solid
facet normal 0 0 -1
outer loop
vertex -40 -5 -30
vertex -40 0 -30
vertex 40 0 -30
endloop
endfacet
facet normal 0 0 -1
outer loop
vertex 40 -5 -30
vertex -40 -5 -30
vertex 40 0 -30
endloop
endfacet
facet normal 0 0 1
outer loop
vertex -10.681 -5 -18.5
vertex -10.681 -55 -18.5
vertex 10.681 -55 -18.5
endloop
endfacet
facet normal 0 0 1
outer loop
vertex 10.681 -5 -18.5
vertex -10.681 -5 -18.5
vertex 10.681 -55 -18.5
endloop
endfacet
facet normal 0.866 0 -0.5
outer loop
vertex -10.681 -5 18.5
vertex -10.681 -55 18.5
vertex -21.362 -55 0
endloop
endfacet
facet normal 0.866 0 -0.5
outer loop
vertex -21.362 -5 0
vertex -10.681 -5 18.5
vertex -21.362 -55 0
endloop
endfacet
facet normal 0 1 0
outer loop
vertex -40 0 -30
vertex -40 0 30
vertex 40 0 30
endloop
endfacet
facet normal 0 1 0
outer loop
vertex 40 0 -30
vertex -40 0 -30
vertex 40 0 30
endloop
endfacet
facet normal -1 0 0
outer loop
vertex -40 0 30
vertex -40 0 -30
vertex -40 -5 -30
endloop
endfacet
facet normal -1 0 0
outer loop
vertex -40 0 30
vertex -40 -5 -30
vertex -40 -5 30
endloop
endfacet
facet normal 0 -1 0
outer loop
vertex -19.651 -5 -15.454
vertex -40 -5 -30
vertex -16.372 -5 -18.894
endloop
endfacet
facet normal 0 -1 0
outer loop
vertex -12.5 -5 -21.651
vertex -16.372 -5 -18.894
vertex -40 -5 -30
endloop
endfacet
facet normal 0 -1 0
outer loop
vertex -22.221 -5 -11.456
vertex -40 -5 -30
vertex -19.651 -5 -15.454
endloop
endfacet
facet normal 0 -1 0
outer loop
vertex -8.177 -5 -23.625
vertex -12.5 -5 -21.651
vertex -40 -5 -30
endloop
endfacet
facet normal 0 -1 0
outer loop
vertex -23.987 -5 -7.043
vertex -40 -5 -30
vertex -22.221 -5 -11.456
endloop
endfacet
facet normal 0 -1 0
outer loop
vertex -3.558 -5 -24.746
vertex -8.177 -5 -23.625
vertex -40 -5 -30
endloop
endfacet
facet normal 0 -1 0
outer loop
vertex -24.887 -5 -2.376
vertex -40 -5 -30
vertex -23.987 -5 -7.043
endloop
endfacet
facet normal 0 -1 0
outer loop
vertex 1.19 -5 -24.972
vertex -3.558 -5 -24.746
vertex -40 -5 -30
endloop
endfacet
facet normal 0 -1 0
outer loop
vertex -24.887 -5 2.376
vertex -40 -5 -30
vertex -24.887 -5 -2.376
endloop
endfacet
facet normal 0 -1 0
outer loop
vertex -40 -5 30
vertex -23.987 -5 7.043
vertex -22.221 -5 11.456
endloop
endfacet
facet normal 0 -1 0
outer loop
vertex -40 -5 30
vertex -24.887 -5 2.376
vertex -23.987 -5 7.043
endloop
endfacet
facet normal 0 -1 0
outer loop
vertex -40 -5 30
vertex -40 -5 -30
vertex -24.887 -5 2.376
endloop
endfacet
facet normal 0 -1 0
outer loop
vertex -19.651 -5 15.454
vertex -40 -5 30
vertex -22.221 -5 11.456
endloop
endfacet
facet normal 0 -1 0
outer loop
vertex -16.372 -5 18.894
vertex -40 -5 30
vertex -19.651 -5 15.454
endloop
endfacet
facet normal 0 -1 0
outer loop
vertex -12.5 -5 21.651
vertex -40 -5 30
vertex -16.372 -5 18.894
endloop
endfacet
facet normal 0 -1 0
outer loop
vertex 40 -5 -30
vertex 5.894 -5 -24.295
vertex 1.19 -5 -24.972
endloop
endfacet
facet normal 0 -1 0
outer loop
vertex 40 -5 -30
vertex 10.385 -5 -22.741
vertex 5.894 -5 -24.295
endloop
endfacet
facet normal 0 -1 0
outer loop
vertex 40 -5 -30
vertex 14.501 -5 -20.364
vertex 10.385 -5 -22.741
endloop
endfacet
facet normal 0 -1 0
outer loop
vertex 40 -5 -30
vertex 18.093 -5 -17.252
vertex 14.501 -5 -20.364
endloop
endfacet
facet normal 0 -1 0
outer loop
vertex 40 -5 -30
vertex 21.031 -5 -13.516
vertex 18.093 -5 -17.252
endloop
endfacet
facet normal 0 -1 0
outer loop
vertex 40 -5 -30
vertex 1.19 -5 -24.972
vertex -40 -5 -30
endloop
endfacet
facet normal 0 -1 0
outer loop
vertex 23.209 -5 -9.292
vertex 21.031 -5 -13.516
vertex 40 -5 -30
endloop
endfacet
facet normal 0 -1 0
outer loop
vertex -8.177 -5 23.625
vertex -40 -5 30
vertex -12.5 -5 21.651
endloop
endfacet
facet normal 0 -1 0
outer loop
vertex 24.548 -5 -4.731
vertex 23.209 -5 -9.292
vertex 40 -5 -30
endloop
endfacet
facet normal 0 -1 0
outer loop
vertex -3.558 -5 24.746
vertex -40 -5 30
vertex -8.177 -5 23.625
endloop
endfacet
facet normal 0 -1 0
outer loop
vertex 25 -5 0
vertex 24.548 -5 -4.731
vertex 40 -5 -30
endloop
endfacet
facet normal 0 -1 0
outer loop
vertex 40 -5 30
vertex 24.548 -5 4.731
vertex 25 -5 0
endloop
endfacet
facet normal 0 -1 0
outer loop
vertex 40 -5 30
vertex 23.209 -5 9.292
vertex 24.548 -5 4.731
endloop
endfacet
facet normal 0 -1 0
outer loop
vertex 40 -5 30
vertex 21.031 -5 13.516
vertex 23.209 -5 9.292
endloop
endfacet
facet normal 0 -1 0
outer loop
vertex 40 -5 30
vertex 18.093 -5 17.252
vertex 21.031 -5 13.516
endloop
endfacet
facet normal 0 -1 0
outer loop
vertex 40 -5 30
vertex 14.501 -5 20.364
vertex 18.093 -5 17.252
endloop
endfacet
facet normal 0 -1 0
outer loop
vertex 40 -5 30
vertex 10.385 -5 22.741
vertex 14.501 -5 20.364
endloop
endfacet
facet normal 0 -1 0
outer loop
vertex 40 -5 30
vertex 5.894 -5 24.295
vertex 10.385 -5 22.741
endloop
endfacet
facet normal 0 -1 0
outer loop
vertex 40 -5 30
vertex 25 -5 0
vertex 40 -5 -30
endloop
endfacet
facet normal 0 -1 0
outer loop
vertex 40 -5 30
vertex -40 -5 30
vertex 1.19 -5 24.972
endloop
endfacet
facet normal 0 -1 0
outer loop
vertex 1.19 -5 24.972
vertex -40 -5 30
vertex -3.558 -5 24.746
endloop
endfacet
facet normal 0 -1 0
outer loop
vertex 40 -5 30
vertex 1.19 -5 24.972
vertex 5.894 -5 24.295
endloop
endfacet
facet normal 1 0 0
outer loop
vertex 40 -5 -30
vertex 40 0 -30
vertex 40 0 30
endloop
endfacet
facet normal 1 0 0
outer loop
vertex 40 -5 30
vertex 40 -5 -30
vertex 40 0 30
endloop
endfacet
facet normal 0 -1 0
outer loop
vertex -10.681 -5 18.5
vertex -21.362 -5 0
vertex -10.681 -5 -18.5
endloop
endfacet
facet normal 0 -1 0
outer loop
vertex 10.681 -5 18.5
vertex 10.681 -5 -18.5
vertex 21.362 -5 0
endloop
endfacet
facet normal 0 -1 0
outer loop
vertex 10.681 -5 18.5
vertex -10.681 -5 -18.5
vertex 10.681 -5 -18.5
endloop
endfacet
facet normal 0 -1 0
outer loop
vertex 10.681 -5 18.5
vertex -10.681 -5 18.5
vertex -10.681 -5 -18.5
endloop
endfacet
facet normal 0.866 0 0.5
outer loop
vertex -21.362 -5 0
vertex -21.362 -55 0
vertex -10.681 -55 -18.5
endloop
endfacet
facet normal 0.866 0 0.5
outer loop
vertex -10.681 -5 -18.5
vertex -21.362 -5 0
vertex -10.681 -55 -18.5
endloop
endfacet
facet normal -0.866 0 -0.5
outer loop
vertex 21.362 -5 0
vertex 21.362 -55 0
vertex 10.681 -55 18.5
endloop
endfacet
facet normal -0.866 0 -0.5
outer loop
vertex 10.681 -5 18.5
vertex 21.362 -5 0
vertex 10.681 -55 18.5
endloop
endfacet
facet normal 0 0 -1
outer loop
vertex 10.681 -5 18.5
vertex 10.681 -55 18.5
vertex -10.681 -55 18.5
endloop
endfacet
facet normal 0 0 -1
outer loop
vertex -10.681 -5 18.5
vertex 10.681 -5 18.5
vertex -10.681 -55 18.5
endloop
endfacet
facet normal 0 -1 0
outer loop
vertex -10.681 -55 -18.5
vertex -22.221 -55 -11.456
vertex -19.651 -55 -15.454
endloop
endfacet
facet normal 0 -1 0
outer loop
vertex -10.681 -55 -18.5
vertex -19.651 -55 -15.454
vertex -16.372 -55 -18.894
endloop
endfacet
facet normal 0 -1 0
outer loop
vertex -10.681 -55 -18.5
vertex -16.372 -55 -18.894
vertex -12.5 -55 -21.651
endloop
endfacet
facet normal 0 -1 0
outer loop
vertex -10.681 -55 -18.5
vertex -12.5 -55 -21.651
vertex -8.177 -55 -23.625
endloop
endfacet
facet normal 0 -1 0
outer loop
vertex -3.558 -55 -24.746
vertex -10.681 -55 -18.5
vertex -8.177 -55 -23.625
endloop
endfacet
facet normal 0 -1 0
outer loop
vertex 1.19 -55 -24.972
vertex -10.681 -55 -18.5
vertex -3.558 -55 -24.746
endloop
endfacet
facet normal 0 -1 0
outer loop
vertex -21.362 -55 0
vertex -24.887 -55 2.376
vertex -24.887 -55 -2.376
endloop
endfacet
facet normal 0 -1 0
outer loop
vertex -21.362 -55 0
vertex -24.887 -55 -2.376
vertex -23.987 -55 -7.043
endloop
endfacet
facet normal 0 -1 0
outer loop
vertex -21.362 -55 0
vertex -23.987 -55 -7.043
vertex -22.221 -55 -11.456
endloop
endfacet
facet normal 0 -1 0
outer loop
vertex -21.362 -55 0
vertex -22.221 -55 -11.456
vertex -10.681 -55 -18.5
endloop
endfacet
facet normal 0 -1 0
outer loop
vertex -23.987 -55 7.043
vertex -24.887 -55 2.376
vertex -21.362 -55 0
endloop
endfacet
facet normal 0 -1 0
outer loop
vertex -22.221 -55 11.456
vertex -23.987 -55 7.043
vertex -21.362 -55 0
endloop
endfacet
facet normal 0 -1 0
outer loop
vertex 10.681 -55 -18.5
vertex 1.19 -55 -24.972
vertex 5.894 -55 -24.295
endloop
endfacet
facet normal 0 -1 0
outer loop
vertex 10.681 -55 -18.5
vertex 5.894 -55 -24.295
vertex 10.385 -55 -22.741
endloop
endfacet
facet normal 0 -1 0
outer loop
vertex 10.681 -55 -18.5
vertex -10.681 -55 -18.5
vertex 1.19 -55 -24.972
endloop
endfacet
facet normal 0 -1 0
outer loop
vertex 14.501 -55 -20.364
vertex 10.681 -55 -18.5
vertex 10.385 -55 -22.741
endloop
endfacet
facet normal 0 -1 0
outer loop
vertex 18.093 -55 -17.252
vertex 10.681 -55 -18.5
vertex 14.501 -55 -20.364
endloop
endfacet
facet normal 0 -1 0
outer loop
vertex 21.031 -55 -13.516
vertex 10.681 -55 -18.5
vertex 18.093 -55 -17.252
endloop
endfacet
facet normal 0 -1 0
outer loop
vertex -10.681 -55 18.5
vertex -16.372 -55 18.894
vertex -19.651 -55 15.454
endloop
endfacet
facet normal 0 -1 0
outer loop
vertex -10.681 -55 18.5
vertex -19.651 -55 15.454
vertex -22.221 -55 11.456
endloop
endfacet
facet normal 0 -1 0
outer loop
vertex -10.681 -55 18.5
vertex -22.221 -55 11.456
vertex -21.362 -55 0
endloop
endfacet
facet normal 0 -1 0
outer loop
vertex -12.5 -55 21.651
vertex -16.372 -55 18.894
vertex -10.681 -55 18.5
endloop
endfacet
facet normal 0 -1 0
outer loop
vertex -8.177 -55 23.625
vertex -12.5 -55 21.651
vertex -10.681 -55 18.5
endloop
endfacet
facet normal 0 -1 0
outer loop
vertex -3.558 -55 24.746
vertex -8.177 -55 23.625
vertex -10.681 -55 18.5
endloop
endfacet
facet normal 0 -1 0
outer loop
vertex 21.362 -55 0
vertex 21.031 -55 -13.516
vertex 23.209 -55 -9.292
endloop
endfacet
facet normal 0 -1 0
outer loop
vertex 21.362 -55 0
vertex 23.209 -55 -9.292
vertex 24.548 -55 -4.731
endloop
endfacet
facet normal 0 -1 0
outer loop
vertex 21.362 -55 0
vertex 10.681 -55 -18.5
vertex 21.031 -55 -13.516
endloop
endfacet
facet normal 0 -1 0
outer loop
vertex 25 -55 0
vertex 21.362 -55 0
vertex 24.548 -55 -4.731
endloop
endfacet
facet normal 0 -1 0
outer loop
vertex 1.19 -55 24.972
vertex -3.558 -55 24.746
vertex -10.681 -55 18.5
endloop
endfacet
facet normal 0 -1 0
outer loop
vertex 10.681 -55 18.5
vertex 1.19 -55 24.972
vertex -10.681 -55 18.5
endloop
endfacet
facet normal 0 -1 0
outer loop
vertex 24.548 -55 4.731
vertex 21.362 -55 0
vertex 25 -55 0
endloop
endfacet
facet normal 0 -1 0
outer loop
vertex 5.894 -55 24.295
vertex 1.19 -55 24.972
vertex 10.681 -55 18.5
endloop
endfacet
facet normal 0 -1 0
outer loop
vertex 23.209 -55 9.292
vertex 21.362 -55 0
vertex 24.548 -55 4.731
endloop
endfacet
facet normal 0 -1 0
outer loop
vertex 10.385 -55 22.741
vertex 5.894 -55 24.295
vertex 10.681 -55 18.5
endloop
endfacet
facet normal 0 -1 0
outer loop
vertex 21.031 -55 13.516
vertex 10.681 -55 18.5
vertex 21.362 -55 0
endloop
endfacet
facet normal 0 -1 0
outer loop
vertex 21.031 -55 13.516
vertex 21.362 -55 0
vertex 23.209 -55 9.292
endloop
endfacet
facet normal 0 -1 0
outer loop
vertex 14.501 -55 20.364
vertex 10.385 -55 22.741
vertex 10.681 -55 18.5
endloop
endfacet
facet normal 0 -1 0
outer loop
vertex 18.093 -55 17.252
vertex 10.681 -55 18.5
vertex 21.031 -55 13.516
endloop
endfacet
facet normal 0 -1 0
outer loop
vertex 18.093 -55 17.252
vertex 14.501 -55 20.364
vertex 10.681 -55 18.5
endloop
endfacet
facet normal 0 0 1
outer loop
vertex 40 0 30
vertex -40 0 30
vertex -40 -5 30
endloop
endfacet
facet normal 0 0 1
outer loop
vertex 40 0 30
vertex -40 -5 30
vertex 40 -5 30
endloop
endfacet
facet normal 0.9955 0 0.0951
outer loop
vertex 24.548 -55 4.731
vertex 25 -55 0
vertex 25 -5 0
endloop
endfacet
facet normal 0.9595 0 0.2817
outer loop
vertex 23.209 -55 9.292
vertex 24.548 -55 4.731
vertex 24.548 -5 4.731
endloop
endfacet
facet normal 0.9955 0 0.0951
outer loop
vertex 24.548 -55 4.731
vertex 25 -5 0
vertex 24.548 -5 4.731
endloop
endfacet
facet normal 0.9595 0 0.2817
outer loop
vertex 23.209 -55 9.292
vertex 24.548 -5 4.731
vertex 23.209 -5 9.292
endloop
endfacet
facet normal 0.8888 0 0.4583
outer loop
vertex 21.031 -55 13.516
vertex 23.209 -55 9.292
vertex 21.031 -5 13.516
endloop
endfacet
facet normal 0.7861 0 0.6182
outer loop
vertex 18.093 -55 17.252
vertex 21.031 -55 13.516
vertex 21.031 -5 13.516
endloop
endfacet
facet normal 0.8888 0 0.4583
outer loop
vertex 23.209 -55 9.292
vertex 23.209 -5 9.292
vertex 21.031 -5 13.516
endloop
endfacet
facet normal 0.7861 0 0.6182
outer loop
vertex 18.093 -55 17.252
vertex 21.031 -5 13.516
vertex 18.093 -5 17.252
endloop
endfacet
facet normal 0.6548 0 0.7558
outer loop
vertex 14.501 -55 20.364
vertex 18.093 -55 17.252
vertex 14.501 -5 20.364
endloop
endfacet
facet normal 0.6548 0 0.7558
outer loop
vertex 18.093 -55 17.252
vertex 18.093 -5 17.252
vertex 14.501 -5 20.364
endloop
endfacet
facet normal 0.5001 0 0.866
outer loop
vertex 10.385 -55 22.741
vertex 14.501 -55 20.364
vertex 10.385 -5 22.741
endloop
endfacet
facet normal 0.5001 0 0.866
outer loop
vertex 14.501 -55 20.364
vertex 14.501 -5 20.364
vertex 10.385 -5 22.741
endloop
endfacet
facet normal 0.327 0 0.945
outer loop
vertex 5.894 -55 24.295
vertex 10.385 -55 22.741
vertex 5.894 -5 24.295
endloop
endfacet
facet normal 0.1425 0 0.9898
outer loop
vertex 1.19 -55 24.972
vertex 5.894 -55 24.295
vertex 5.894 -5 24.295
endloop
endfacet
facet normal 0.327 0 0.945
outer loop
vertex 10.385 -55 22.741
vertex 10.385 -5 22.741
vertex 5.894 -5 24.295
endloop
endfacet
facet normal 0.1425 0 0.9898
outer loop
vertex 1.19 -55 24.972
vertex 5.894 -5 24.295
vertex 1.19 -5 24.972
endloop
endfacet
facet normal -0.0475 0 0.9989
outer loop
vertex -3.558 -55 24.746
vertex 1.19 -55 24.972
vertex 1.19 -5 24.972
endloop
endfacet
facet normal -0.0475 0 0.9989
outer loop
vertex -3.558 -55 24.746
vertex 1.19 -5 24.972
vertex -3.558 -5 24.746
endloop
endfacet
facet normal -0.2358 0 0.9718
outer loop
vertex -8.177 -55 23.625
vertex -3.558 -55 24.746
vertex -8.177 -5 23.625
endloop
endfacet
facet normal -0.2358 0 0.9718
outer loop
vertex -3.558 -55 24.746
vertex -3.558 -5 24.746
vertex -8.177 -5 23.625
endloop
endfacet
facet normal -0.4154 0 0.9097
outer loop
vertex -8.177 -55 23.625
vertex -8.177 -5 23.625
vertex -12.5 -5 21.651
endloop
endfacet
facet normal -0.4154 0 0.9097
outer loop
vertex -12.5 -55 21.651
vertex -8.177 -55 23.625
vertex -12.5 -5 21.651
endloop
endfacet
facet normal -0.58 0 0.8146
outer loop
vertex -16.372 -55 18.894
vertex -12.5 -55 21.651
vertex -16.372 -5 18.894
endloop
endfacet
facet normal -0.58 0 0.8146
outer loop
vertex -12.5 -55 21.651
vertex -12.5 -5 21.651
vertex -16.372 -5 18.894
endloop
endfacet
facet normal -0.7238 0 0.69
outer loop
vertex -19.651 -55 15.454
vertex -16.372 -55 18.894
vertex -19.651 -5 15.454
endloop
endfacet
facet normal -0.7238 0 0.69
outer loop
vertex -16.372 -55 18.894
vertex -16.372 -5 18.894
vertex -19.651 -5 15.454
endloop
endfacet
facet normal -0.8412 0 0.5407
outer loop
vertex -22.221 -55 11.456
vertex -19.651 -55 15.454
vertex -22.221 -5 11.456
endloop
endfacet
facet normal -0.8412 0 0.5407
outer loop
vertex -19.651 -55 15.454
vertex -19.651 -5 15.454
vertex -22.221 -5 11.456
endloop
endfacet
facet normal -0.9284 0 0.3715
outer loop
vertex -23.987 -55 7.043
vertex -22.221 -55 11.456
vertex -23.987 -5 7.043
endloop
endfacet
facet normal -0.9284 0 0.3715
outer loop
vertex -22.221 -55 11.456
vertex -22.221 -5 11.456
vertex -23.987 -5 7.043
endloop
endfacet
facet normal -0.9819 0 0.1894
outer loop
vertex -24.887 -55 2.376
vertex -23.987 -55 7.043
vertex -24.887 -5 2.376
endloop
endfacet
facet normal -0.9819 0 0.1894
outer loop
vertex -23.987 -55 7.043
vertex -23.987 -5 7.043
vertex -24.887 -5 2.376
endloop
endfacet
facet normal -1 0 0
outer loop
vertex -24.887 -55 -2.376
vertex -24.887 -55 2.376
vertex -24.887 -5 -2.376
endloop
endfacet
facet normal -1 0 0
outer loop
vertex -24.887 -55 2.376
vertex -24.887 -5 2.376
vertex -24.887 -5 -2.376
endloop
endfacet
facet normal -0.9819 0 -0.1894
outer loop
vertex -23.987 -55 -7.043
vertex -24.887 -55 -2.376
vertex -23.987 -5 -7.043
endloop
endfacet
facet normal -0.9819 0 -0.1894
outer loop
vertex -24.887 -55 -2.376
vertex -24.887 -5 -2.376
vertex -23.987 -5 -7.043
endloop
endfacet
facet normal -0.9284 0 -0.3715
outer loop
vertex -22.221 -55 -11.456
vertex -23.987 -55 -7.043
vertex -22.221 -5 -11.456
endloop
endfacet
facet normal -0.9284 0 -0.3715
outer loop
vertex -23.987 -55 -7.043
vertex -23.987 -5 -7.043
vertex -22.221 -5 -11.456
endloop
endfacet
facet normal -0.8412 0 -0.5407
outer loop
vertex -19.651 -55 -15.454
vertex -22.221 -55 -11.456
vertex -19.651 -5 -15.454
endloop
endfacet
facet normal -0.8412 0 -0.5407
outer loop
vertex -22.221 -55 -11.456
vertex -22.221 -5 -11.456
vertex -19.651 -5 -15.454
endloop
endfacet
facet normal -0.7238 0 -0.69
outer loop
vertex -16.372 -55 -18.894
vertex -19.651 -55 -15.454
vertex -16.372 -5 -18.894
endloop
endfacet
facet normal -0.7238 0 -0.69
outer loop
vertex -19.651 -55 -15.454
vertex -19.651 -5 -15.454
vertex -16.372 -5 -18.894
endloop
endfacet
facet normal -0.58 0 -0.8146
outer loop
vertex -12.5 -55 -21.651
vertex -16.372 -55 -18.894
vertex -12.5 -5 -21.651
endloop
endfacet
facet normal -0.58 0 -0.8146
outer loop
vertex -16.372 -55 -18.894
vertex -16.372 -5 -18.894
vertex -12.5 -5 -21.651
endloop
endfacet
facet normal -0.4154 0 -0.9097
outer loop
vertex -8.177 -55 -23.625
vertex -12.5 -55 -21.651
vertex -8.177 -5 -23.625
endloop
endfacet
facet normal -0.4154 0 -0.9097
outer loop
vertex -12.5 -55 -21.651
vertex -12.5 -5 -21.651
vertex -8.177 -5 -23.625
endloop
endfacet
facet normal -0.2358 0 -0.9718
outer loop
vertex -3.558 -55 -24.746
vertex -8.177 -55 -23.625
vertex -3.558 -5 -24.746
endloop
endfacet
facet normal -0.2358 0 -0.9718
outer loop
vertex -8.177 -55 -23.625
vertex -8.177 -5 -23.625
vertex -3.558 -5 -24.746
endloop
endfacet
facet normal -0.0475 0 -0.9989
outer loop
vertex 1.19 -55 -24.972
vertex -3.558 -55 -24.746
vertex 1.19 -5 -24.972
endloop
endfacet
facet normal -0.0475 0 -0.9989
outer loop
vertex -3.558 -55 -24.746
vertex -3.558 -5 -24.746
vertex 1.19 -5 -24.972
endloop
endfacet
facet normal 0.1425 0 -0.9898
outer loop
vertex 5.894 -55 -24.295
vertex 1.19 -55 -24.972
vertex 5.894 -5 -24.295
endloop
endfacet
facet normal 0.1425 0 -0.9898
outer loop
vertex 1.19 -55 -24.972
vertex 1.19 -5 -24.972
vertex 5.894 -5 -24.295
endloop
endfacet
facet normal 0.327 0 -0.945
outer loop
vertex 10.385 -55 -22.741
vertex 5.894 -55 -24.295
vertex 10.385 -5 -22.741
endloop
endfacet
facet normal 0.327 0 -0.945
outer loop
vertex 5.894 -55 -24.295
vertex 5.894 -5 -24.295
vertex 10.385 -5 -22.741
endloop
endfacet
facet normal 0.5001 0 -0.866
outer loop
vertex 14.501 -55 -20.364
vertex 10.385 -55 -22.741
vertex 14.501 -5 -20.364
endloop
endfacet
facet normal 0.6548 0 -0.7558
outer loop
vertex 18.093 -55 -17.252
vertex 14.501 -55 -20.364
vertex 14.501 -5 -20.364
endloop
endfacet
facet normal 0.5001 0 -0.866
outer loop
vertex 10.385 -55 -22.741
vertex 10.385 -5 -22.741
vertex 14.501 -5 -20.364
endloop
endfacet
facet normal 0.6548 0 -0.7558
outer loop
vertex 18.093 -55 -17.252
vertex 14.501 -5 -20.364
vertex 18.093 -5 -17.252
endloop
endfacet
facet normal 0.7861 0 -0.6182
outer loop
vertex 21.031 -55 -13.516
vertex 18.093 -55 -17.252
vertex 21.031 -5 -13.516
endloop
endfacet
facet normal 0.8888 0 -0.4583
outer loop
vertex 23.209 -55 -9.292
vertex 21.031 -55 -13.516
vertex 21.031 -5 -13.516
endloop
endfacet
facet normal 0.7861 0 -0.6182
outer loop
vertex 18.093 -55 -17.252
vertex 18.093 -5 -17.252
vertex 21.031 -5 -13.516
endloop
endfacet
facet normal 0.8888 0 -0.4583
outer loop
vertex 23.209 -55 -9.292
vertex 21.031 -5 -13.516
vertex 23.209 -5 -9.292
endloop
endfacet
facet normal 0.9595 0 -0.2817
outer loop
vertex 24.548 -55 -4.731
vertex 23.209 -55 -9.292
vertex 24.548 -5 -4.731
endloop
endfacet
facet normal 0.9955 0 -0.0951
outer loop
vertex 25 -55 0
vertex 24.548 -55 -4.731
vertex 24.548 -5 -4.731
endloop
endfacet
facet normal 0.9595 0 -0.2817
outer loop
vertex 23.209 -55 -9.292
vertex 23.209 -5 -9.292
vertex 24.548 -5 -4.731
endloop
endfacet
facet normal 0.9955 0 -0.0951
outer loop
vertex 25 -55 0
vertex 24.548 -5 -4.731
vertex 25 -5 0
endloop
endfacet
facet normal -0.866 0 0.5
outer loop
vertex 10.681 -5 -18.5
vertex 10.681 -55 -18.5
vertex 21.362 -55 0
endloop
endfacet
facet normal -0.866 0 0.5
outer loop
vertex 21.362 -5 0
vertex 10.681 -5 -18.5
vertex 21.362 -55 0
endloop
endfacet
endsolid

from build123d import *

# Parameters (mm, degrees)
F0_W     = 80
F0_H     = 60
F1_DEPTH = 5
F2_R     = 25
F3_DEPTH = 50
F5_DEPTH = 50


with BuildPart() as f1:
    # F0 (on Front) → F1 (new body)
    with BuildSketch(Plane.XZ):
        Rectangle(F0_W, F0_H)
    extrude(amount=F1_DEPTH)

    # F2 (on face) → F3 (join)
    with BuildSketch(Plane.XZ.offset(5)):
        Circle(F2_R)
    extrude(amount=F3_DEPTH)

    # F4 (on face) → F5 (cut)
    with BuildSketch(Plane.XZ.offset(55)):
        Polygon((10.68098, -18.5), (21.36196, 0), (10.68098, 18.5), (-10.68098, 18.5), (-21.36196, 0), (-10.68098, -18.5), align=None)
    extrude(amount=-F5_DEPTH, mode=Mode.SUBTRACT)


solid = f1.part
